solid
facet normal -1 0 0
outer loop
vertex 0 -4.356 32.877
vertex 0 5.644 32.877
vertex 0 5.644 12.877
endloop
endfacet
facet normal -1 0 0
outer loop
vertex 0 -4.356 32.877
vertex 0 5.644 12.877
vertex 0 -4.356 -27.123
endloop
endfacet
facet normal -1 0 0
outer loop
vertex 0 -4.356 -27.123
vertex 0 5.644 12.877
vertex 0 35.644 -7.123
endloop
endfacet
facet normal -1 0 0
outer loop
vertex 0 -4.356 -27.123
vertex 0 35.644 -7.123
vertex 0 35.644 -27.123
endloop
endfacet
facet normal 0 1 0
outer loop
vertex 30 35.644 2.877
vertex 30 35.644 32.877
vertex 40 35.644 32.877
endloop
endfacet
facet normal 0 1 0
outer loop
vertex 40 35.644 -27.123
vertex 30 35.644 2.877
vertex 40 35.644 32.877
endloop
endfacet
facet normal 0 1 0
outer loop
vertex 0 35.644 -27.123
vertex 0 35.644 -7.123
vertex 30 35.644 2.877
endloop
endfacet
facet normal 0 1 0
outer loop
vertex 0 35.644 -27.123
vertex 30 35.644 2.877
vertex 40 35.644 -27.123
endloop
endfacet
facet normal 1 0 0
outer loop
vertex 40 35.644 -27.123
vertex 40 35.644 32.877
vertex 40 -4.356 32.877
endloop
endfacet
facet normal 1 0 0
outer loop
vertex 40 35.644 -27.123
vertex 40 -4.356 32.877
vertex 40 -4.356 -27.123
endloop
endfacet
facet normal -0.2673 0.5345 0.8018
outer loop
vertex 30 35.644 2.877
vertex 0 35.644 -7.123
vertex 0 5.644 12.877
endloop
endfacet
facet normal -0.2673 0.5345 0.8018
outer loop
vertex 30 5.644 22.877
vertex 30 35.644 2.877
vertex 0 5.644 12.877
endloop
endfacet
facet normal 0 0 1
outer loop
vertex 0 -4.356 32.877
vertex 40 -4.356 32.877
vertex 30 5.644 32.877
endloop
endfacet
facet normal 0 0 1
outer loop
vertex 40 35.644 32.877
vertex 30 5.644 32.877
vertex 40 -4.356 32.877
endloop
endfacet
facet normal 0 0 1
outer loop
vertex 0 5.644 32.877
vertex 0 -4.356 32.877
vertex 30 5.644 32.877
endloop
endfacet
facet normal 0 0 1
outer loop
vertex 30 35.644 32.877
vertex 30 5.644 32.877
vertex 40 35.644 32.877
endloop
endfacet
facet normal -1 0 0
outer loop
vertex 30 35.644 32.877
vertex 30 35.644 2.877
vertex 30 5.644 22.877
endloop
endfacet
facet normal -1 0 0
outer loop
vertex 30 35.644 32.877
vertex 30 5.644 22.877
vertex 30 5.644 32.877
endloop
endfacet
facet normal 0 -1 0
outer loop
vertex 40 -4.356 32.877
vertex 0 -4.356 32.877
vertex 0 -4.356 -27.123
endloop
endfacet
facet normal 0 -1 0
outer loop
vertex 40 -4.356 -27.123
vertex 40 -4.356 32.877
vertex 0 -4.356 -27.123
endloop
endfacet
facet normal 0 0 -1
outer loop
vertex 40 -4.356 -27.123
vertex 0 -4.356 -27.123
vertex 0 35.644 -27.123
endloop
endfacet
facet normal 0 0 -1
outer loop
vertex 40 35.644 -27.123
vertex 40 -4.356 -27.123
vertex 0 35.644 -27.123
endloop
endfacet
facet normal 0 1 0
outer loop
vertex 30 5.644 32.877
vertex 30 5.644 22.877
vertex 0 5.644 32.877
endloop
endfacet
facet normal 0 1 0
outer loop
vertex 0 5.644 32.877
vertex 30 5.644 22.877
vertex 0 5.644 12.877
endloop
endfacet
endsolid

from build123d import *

# Parameters (mm, degrees)
SKETCH_10_W         = 60
SKETCH_10_H         = 40
EXTRUDE_3_DEPTH     = 40
CUT_EXTRUDE_2_DEPTH = 30


with BuildPart() as part:
    # 草圖10 → 填料-伸長3 (new body)
    with BuildSketch(Plane(origin=(0, 0, 0), x_dir=(0, 0, -1), z_dir=(1, 0, 0))):
        with Locations((-2.876712329, 15.643835616)):
            Rectangle(SKETCH_10_W, SKETCH_10_H)
    extrude(amount=EXTRUDE_3_DEPTH)

    # 草圖11 → 除料-伸長2 (cut)
    with BuildSketch(Plane(origin=(0, 35.643835616, 0), x_dir=(1, 0, 0), z_dir=(0, 1, 0))):
        Polygon((0, -12.876712329), (30, -22.876712329), (30, -32.876712329), (0, -32.876712329), align=None)
    extrude(amount=-CUT_EXTRUDE_2_DEPTH, mode=Mode.SUBTRACT)

    # 除料-掃出1: sweep along a path in 草圖13
    with BuildLine(Plane(origin=(0, 5.643835616, 0), x_dir=(1, 0, 0), z_dir=(0, 1, 0))) as sweep_1_path:
        Line((30, -22.876712329), (0, -12.876712329))
    # 草圖12 → 除料-掃出1 (sweep, cut)
    with BuildSketch(Plane.ZY.offset(-30)):
        Polygon((22.876712329, 5.643835616), (2.876712329, 35.643835616), (32.876712329, 35.643835616), (32.876712329, 5.643835616), align=None)
    sweep(path=sweep_1_path.line, mode=Mode.SUBTRACT)


solid = part.part
